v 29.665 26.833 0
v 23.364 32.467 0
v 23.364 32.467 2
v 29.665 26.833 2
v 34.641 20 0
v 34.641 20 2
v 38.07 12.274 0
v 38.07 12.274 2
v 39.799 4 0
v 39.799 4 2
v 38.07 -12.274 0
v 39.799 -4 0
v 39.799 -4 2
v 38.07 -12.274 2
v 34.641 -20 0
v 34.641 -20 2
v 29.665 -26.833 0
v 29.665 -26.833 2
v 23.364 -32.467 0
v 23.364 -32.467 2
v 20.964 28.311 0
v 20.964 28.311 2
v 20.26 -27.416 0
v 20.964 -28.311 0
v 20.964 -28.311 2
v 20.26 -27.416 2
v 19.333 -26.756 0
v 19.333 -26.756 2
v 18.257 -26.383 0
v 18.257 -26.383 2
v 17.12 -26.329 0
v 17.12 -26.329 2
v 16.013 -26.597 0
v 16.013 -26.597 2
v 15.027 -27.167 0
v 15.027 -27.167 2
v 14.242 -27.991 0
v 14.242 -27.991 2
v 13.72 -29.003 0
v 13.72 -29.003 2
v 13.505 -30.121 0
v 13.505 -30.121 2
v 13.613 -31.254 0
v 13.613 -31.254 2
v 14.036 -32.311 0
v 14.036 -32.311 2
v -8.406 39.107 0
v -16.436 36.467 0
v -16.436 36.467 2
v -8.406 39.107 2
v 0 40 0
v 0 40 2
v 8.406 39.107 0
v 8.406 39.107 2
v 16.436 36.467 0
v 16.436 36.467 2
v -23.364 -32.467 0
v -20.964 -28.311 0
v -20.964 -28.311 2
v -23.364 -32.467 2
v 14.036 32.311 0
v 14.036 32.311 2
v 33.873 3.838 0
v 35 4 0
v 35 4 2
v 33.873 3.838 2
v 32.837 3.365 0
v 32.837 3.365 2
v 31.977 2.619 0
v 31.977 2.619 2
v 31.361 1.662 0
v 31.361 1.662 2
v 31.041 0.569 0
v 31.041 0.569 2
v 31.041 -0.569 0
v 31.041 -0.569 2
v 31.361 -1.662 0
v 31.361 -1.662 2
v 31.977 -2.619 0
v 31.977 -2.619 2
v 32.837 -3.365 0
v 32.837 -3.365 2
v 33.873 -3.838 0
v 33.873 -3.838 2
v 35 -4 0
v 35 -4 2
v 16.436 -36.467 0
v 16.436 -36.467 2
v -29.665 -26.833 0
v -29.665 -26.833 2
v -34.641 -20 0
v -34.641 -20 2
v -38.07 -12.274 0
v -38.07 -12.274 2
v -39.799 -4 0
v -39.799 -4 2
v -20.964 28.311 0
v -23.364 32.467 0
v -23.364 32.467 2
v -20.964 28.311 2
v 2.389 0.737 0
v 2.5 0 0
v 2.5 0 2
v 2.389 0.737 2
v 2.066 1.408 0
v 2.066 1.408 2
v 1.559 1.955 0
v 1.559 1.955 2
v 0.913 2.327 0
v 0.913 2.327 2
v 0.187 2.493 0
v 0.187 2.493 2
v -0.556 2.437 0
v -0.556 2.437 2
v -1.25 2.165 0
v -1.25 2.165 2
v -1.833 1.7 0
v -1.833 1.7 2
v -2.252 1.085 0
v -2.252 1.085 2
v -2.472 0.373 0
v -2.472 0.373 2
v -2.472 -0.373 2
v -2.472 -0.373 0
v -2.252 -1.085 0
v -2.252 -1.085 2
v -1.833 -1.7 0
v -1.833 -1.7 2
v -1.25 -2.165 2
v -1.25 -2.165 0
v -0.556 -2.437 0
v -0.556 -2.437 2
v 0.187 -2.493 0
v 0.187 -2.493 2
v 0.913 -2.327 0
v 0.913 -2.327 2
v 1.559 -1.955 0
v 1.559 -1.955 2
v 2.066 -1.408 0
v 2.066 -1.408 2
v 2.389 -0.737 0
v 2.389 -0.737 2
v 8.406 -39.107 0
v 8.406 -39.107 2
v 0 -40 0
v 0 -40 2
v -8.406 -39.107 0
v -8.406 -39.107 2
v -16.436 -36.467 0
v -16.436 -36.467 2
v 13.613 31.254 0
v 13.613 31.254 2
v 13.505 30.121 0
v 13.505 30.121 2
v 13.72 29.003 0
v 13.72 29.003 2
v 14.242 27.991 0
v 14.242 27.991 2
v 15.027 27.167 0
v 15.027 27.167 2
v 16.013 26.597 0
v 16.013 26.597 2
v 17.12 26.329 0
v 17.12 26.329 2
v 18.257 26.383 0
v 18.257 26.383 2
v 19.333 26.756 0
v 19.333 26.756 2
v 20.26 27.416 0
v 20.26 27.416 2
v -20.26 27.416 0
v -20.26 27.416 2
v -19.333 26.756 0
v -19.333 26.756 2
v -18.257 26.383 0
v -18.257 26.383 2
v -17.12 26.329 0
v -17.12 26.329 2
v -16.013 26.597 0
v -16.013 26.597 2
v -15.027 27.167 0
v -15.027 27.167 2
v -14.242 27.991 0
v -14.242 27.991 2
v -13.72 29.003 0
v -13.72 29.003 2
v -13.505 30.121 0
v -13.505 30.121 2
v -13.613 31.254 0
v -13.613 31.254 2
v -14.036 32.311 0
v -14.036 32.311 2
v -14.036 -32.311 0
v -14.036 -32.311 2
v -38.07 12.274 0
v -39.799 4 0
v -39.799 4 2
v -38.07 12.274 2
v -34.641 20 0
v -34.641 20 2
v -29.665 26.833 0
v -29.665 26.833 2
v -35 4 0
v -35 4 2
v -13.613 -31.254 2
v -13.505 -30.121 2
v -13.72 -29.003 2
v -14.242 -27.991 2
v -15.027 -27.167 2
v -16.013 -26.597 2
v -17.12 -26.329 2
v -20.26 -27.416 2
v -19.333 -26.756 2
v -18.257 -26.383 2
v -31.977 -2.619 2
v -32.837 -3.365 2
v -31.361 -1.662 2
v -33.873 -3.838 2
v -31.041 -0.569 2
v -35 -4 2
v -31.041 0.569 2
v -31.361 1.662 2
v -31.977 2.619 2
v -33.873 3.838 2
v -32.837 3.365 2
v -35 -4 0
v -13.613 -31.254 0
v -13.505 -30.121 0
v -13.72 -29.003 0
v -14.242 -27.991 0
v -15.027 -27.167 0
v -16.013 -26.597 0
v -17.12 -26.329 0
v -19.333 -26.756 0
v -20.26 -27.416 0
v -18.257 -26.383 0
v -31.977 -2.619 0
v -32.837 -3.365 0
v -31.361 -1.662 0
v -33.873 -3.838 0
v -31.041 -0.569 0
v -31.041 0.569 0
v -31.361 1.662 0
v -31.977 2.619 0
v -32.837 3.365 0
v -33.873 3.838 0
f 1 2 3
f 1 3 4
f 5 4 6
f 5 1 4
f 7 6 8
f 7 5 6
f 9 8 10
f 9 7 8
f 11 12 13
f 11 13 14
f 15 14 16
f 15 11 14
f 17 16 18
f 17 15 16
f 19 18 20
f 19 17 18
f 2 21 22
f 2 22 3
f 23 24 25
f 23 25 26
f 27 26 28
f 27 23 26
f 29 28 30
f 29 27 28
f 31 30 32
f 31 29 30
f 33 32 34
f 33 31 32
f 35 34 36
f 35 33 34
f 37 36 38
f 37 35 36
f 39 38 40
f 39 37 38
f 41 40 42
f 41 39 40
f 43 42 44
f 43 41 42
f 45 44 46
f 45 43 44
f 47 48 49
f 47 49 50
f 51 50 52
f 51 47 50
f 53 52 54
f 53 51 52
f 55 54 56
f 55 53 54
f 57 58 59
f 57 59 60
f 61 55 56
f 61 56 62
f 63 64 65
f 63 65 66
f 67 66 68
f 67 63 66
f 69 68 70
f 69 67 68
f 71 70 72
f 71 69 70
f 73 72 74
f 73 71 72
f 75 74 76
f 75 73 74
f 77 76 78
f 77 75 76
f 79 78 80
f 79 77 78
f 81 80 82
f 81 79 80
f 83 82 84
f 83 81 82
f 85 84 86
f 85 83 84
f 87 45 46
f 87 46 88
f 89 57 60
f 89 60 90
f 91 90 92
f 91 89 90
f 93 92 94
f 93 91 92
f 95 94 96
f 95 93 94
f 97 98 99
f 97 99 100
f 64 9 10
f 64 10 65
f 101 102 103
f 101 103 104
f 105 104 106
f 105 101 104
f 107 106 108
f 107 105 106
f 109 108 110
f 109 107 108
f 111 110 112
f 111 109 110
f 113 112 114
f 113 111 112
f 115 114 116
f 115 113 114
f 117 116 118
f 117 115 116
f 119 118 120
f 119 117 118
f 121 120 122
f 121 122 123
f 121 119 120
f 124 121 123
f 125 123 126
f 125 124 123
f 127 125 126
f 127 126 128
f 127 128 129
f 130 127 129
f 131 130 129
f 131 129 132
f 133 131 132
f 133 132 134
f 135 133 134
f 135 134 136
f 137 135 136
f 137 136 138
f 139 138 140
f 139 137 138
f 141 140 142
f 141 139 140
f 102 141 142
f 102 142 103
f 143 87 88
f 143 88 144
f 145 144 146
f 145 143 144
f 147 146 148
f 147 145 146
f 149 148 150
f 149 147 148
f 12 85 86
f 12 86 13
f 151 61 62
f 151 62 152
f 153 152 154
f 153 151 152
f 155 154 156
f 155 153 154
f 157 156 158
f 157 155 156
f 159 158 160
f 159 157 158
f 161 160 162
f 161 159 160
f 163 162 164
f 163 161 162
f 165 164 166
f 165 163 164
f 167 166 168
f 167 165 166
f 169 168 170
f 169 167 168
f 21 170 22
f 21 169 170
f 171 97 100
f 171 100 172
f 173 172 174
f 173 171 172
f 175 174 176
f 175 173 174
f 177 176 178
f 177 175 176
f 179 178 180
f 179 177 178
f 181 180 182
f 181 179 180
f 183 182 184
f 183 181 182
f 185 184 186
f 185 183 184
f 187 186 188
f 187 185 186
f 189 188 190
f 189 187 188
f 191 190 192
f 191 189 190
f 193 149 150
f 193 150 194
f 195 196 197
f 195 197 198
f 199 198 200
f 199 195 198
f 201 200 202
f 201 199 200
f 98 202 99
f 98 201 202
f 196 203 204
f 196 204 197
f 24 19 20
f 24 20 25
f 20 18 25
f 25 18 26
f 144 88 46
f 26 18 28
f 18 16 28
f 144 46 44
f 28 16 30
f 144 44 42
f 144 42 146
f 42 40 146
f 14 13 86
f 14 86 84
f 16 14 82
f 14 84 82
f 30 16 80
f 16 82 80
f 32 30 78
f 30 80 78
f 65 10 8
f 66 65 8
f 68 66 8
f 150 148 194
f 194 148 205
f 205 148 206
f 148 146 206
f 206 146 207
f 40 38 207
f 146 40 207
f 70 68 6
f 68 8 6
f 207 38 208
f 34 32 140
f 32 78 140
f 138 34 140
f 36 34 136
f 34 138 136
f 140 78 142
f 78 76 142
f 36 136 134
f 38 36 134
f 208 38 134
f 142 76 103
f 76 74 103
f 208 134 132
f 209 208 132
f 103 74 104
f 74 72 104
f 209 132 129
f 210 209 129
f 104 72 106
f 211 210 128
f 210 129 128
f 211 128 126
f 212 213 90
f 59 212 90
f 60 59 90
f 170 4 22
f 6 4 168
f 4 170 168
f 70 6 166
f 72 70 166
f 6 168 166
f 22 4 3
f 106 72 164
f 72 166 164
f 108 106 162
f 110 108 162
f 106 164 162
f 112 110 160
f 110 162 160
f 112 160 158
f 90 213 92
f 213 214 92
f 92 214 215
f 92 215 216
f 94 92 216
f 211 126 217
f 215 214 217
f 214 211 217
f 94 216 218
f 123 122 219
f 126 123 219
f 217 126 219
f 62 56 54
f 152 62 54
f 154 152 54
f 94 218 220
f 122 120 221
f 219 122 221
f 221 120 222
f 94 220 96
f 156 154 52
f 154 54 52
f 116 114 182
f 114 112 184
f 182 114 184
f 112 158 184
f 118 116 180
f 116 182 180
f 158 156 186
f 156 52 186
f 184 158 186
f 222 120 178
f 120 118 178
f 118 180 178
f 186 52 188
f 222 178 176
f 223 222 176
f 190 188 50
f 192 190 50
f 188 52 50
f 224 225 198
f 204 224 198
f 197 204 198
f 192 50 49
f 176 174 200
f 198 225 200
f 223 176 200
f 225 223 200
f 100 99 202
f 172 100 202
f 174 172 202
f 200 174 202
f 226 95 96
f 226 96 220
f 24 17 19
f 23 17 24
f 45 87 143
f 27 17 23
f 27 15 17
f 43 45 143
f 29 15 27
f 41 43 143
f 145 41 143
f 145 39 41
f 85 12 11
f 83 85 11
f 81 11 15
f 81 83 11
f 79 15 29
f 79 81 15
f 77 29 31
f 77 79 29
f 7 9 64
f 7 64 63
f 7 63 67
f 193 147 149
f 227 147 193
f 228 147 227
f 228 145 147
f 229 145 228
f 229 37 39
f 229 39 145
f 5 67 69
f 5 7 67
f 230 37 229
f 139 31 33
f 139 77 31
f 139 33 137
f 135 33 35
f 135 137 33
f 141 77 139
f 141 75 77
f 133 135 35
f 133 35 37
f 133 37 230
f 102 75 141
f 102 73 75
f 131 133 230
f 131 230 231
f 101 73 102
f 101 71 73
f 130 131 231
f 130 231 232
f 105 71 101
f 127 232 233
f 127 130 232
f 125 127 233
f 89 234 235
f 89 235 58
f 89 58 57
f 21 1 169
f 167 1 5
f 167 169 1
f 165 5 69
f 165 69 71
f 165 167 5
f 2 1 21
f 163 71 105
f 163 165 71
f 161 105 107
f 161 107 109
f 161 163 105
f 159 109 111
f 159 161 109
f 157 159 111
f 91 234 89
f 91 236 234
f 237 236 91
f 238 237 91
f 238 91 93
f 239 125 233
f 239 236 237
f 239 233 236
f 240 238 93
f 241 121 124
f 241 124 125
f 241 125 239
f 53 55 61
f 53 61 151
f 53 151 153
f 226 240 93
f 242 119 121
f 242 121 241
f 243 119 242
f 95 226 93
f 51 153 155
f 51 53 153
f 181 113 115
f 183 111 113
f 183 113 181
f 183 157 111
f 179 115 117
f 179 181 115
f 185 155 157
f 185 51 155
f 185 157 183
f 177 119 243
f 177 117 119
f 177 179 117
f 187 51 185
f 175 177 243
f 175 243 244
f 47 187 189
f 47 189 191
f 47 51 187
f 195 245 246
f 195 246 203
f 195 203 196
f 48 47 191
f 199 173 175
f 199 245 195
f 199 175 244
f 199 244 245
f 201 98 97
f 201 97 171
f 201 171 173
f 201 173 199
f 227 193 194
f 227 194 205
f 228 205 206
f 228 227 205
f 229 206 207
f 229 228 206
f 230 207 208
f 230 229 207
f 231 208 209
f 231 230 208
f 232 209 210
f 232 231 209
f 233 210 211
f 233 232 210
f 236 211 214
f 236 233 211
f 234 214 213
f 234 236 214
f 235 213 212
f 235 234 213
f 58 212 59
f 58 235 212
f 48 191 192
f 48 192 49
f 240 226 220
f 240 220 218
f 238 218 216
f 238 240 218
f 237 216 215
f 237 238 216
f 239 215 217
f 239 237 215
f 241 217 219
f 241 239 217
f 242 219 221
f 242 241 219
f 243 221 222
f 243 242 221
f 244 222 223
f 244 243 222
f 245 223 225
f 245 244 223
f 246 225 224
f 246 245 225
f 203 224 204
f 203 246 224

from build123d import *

# Parameters (mm, degrees)
SKETCH_1_R      = 2.5
EXTRUDE_1_DEPTH = 2


with BuildPart() as part:
    # 草图1 → 凸台-拉伸1 (new body)
    with BuildSketch(Plane.XY):
        with BuildLine():
            Line((-35, 4), (-39.799497484, 4))
            ThreePointArc((-39.799497484, 4), (-34.641016151, 20), (-23.363850357, 32.467375879))
            Line((-23.363850357, 32.467375879), (-20.964101615, 28.310889132))
            ThreePointArc((-20.964101615, 28.310889132), (-15.5, 26.846787517), (-14.035898385, 32.310889132))
            Line((-14.035898385, 32.310889132), (-16.435647127, 36.467375879))
            ThreePointArc((-16.435647127, 36.467375879), (0, 40), (16.435647127, 36.467375879))
            Line((16.435647127, 36.467375879), (14.035898385, 32.310889132))
            ThreePointArc((14.035898385, 32.310889132), (15.5, 26.846787517), (20.964101615, 28.310889132))
            Line((20.964101615, 28.310889132), (23.363850357, 32.467375879))
            ThreePointArc((23.363850357, 32.467375879), (34.641016151, 20), (39.799497484, 4))
            Line((39.799497484, 4), (35, 4))
            ThreePointArc((35, 4), (31, 0), (35, -4))
            Line((35, -4), (39.799497484, -4))
            ThreePointArc((39.799497484, -4), (34.641016151, -20), (23.363850357, -32.467375879))
            Line((23.363850357, -32.467375879), (20.964101615, -28.310889132))
            ThreePointArc((20.964101615, -28.310889132), (15.5, -26.846787517), (14.035898385, -32.310889132))
            Line((14.035898385, -32.310889132), (16.435647127, -36.467375879))
            ThreePointArc((16.435647127, -36.467375879), (0, -40), (-16.435647127, -36.467375879))
            Line((-16.435647127, -36.467375879), (-14.035898385, -32.310889132))
            ThreePointArc((-14.035898385, -32.310889132), (-15.5, -26.846787517), (-20.964101615, -28.310889132))
            Line((-20.964101615, -28.310889132), (-23.363850357, -32.467375879))
            ThreePointArc((-23.363850357, -32.467375879), (-34.641016151, -20), (-39.799497484, -4))
            Line((-39.799497484, -4), (-35, -4))
            ThreePointArc((-35, -4), (-31, 0), (-35, 4))
        make_face()
        Circle(SKETCH_1_R, mode=Mode.SUBTRACT)
    extrude(amount=EXTRUDE_1_DEPTH)


solid = part.part
